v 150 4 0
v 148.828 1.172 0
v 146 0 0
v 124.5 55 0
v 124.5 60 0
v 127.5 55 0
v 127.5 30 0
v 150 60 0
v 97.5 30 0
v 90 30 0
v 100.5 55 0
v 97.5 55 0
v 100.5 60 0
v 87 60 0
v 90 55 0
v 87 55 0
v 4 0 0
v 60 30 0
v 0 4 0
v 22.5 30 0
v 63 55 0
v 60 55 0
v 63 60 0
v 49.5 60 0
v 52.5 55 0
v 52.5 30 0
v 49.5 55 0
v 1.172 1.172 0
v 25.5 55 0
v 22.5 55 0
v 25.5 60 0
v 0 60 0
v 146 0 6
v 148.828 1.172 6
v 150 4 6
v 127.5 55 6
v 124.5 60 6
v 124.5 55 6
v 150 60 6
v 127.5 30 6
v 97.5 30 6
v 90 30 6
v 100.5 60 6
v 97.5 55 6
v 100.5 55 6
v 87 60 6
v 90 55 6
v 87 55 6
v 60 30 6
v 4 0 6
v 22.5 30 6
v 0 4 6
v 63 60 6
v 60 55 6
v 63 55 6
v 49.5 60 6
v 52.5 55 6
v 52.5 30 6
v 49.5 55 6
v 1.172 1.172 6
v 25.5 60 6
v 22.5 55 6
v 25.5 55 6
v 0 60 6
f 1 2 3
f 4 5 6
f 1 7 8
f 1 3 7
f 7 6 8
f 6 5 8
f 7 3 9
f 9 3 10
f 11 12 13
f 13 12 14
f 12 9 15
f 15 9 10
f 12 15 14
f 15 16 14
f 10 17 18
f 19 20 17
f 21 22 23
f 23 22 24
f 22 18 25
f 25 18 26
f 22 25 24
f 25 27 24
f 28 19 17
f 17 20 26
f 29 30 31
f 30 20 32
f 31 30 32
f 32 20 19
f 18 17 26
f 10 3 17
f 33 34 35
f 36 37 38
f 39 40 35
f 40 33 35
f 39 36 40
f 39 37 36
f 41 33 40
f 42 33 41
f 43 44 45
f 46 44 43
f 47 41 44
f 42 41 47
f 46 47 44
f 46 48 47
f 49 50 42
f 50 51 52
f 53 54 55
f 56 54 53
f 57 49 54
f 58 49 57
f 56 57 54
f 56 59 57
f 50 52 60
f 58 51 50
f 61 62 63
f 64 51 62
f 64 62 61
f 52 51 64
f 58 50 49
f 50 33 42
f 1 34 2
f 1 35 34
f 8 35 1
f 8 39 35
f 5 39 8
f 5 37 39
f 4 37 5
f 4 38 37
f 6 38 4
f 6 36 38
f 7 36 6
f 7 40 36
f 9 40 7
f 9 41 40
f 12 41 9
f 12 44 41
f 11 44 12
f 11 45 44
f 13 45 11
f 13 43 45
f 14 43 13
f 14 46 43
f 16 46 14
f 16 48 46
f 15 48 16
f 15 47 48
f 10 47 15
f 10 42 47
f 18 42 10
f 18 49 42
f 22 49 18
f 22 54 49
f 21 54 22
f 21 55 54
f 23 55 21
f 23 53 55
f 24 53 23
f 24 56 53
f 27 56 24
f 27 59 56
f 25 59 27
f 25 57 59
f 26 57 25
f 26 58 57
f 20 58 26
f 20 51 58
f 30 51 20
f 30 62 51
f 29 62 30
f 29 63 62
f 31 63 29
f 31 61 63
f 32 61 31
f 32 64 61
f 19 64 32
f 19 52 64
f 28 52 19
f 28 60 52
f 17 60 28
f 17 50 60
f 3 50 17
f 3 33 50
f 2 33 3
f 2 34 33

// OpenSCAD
$fn = 32;

// ----------------------------------------------------------------------
// Oversize slot bar: 150 mm bar with 3 oversize windows
// ----------------------------------------------------------------------

// --- parameters (mm) ---
profile_height = 6;       // extrusion height
profile_points = 32;      // points of the closed outline

profile = [[0, 4], [1.172, 1.172], [4, 0], [146, 0], [148.828, 1.172], [150, 4], [150, 60], [124.5, 60], [124.5, 55], [127.5, 55], [127.5, 30], [97.5, 30], [97.5, 55], [100.5, 55], [100.5, 60], [87, 60], [87, 55], [90, 55], [90, 30], [60, 30], [60, 55], [63, 55], [63, 60], [49.5, 60], [49.5, 55], [52.5, 55], [52.5, 30], [22.5, 30], [22.5, 55], [25.5, 55], [25.5, 60], [0, 60]];  // single closed polygon, 32 points, counter clockwise

// --- the one profile operation ---
linear_extrude(height = profile_height) polygon(points = profile);
